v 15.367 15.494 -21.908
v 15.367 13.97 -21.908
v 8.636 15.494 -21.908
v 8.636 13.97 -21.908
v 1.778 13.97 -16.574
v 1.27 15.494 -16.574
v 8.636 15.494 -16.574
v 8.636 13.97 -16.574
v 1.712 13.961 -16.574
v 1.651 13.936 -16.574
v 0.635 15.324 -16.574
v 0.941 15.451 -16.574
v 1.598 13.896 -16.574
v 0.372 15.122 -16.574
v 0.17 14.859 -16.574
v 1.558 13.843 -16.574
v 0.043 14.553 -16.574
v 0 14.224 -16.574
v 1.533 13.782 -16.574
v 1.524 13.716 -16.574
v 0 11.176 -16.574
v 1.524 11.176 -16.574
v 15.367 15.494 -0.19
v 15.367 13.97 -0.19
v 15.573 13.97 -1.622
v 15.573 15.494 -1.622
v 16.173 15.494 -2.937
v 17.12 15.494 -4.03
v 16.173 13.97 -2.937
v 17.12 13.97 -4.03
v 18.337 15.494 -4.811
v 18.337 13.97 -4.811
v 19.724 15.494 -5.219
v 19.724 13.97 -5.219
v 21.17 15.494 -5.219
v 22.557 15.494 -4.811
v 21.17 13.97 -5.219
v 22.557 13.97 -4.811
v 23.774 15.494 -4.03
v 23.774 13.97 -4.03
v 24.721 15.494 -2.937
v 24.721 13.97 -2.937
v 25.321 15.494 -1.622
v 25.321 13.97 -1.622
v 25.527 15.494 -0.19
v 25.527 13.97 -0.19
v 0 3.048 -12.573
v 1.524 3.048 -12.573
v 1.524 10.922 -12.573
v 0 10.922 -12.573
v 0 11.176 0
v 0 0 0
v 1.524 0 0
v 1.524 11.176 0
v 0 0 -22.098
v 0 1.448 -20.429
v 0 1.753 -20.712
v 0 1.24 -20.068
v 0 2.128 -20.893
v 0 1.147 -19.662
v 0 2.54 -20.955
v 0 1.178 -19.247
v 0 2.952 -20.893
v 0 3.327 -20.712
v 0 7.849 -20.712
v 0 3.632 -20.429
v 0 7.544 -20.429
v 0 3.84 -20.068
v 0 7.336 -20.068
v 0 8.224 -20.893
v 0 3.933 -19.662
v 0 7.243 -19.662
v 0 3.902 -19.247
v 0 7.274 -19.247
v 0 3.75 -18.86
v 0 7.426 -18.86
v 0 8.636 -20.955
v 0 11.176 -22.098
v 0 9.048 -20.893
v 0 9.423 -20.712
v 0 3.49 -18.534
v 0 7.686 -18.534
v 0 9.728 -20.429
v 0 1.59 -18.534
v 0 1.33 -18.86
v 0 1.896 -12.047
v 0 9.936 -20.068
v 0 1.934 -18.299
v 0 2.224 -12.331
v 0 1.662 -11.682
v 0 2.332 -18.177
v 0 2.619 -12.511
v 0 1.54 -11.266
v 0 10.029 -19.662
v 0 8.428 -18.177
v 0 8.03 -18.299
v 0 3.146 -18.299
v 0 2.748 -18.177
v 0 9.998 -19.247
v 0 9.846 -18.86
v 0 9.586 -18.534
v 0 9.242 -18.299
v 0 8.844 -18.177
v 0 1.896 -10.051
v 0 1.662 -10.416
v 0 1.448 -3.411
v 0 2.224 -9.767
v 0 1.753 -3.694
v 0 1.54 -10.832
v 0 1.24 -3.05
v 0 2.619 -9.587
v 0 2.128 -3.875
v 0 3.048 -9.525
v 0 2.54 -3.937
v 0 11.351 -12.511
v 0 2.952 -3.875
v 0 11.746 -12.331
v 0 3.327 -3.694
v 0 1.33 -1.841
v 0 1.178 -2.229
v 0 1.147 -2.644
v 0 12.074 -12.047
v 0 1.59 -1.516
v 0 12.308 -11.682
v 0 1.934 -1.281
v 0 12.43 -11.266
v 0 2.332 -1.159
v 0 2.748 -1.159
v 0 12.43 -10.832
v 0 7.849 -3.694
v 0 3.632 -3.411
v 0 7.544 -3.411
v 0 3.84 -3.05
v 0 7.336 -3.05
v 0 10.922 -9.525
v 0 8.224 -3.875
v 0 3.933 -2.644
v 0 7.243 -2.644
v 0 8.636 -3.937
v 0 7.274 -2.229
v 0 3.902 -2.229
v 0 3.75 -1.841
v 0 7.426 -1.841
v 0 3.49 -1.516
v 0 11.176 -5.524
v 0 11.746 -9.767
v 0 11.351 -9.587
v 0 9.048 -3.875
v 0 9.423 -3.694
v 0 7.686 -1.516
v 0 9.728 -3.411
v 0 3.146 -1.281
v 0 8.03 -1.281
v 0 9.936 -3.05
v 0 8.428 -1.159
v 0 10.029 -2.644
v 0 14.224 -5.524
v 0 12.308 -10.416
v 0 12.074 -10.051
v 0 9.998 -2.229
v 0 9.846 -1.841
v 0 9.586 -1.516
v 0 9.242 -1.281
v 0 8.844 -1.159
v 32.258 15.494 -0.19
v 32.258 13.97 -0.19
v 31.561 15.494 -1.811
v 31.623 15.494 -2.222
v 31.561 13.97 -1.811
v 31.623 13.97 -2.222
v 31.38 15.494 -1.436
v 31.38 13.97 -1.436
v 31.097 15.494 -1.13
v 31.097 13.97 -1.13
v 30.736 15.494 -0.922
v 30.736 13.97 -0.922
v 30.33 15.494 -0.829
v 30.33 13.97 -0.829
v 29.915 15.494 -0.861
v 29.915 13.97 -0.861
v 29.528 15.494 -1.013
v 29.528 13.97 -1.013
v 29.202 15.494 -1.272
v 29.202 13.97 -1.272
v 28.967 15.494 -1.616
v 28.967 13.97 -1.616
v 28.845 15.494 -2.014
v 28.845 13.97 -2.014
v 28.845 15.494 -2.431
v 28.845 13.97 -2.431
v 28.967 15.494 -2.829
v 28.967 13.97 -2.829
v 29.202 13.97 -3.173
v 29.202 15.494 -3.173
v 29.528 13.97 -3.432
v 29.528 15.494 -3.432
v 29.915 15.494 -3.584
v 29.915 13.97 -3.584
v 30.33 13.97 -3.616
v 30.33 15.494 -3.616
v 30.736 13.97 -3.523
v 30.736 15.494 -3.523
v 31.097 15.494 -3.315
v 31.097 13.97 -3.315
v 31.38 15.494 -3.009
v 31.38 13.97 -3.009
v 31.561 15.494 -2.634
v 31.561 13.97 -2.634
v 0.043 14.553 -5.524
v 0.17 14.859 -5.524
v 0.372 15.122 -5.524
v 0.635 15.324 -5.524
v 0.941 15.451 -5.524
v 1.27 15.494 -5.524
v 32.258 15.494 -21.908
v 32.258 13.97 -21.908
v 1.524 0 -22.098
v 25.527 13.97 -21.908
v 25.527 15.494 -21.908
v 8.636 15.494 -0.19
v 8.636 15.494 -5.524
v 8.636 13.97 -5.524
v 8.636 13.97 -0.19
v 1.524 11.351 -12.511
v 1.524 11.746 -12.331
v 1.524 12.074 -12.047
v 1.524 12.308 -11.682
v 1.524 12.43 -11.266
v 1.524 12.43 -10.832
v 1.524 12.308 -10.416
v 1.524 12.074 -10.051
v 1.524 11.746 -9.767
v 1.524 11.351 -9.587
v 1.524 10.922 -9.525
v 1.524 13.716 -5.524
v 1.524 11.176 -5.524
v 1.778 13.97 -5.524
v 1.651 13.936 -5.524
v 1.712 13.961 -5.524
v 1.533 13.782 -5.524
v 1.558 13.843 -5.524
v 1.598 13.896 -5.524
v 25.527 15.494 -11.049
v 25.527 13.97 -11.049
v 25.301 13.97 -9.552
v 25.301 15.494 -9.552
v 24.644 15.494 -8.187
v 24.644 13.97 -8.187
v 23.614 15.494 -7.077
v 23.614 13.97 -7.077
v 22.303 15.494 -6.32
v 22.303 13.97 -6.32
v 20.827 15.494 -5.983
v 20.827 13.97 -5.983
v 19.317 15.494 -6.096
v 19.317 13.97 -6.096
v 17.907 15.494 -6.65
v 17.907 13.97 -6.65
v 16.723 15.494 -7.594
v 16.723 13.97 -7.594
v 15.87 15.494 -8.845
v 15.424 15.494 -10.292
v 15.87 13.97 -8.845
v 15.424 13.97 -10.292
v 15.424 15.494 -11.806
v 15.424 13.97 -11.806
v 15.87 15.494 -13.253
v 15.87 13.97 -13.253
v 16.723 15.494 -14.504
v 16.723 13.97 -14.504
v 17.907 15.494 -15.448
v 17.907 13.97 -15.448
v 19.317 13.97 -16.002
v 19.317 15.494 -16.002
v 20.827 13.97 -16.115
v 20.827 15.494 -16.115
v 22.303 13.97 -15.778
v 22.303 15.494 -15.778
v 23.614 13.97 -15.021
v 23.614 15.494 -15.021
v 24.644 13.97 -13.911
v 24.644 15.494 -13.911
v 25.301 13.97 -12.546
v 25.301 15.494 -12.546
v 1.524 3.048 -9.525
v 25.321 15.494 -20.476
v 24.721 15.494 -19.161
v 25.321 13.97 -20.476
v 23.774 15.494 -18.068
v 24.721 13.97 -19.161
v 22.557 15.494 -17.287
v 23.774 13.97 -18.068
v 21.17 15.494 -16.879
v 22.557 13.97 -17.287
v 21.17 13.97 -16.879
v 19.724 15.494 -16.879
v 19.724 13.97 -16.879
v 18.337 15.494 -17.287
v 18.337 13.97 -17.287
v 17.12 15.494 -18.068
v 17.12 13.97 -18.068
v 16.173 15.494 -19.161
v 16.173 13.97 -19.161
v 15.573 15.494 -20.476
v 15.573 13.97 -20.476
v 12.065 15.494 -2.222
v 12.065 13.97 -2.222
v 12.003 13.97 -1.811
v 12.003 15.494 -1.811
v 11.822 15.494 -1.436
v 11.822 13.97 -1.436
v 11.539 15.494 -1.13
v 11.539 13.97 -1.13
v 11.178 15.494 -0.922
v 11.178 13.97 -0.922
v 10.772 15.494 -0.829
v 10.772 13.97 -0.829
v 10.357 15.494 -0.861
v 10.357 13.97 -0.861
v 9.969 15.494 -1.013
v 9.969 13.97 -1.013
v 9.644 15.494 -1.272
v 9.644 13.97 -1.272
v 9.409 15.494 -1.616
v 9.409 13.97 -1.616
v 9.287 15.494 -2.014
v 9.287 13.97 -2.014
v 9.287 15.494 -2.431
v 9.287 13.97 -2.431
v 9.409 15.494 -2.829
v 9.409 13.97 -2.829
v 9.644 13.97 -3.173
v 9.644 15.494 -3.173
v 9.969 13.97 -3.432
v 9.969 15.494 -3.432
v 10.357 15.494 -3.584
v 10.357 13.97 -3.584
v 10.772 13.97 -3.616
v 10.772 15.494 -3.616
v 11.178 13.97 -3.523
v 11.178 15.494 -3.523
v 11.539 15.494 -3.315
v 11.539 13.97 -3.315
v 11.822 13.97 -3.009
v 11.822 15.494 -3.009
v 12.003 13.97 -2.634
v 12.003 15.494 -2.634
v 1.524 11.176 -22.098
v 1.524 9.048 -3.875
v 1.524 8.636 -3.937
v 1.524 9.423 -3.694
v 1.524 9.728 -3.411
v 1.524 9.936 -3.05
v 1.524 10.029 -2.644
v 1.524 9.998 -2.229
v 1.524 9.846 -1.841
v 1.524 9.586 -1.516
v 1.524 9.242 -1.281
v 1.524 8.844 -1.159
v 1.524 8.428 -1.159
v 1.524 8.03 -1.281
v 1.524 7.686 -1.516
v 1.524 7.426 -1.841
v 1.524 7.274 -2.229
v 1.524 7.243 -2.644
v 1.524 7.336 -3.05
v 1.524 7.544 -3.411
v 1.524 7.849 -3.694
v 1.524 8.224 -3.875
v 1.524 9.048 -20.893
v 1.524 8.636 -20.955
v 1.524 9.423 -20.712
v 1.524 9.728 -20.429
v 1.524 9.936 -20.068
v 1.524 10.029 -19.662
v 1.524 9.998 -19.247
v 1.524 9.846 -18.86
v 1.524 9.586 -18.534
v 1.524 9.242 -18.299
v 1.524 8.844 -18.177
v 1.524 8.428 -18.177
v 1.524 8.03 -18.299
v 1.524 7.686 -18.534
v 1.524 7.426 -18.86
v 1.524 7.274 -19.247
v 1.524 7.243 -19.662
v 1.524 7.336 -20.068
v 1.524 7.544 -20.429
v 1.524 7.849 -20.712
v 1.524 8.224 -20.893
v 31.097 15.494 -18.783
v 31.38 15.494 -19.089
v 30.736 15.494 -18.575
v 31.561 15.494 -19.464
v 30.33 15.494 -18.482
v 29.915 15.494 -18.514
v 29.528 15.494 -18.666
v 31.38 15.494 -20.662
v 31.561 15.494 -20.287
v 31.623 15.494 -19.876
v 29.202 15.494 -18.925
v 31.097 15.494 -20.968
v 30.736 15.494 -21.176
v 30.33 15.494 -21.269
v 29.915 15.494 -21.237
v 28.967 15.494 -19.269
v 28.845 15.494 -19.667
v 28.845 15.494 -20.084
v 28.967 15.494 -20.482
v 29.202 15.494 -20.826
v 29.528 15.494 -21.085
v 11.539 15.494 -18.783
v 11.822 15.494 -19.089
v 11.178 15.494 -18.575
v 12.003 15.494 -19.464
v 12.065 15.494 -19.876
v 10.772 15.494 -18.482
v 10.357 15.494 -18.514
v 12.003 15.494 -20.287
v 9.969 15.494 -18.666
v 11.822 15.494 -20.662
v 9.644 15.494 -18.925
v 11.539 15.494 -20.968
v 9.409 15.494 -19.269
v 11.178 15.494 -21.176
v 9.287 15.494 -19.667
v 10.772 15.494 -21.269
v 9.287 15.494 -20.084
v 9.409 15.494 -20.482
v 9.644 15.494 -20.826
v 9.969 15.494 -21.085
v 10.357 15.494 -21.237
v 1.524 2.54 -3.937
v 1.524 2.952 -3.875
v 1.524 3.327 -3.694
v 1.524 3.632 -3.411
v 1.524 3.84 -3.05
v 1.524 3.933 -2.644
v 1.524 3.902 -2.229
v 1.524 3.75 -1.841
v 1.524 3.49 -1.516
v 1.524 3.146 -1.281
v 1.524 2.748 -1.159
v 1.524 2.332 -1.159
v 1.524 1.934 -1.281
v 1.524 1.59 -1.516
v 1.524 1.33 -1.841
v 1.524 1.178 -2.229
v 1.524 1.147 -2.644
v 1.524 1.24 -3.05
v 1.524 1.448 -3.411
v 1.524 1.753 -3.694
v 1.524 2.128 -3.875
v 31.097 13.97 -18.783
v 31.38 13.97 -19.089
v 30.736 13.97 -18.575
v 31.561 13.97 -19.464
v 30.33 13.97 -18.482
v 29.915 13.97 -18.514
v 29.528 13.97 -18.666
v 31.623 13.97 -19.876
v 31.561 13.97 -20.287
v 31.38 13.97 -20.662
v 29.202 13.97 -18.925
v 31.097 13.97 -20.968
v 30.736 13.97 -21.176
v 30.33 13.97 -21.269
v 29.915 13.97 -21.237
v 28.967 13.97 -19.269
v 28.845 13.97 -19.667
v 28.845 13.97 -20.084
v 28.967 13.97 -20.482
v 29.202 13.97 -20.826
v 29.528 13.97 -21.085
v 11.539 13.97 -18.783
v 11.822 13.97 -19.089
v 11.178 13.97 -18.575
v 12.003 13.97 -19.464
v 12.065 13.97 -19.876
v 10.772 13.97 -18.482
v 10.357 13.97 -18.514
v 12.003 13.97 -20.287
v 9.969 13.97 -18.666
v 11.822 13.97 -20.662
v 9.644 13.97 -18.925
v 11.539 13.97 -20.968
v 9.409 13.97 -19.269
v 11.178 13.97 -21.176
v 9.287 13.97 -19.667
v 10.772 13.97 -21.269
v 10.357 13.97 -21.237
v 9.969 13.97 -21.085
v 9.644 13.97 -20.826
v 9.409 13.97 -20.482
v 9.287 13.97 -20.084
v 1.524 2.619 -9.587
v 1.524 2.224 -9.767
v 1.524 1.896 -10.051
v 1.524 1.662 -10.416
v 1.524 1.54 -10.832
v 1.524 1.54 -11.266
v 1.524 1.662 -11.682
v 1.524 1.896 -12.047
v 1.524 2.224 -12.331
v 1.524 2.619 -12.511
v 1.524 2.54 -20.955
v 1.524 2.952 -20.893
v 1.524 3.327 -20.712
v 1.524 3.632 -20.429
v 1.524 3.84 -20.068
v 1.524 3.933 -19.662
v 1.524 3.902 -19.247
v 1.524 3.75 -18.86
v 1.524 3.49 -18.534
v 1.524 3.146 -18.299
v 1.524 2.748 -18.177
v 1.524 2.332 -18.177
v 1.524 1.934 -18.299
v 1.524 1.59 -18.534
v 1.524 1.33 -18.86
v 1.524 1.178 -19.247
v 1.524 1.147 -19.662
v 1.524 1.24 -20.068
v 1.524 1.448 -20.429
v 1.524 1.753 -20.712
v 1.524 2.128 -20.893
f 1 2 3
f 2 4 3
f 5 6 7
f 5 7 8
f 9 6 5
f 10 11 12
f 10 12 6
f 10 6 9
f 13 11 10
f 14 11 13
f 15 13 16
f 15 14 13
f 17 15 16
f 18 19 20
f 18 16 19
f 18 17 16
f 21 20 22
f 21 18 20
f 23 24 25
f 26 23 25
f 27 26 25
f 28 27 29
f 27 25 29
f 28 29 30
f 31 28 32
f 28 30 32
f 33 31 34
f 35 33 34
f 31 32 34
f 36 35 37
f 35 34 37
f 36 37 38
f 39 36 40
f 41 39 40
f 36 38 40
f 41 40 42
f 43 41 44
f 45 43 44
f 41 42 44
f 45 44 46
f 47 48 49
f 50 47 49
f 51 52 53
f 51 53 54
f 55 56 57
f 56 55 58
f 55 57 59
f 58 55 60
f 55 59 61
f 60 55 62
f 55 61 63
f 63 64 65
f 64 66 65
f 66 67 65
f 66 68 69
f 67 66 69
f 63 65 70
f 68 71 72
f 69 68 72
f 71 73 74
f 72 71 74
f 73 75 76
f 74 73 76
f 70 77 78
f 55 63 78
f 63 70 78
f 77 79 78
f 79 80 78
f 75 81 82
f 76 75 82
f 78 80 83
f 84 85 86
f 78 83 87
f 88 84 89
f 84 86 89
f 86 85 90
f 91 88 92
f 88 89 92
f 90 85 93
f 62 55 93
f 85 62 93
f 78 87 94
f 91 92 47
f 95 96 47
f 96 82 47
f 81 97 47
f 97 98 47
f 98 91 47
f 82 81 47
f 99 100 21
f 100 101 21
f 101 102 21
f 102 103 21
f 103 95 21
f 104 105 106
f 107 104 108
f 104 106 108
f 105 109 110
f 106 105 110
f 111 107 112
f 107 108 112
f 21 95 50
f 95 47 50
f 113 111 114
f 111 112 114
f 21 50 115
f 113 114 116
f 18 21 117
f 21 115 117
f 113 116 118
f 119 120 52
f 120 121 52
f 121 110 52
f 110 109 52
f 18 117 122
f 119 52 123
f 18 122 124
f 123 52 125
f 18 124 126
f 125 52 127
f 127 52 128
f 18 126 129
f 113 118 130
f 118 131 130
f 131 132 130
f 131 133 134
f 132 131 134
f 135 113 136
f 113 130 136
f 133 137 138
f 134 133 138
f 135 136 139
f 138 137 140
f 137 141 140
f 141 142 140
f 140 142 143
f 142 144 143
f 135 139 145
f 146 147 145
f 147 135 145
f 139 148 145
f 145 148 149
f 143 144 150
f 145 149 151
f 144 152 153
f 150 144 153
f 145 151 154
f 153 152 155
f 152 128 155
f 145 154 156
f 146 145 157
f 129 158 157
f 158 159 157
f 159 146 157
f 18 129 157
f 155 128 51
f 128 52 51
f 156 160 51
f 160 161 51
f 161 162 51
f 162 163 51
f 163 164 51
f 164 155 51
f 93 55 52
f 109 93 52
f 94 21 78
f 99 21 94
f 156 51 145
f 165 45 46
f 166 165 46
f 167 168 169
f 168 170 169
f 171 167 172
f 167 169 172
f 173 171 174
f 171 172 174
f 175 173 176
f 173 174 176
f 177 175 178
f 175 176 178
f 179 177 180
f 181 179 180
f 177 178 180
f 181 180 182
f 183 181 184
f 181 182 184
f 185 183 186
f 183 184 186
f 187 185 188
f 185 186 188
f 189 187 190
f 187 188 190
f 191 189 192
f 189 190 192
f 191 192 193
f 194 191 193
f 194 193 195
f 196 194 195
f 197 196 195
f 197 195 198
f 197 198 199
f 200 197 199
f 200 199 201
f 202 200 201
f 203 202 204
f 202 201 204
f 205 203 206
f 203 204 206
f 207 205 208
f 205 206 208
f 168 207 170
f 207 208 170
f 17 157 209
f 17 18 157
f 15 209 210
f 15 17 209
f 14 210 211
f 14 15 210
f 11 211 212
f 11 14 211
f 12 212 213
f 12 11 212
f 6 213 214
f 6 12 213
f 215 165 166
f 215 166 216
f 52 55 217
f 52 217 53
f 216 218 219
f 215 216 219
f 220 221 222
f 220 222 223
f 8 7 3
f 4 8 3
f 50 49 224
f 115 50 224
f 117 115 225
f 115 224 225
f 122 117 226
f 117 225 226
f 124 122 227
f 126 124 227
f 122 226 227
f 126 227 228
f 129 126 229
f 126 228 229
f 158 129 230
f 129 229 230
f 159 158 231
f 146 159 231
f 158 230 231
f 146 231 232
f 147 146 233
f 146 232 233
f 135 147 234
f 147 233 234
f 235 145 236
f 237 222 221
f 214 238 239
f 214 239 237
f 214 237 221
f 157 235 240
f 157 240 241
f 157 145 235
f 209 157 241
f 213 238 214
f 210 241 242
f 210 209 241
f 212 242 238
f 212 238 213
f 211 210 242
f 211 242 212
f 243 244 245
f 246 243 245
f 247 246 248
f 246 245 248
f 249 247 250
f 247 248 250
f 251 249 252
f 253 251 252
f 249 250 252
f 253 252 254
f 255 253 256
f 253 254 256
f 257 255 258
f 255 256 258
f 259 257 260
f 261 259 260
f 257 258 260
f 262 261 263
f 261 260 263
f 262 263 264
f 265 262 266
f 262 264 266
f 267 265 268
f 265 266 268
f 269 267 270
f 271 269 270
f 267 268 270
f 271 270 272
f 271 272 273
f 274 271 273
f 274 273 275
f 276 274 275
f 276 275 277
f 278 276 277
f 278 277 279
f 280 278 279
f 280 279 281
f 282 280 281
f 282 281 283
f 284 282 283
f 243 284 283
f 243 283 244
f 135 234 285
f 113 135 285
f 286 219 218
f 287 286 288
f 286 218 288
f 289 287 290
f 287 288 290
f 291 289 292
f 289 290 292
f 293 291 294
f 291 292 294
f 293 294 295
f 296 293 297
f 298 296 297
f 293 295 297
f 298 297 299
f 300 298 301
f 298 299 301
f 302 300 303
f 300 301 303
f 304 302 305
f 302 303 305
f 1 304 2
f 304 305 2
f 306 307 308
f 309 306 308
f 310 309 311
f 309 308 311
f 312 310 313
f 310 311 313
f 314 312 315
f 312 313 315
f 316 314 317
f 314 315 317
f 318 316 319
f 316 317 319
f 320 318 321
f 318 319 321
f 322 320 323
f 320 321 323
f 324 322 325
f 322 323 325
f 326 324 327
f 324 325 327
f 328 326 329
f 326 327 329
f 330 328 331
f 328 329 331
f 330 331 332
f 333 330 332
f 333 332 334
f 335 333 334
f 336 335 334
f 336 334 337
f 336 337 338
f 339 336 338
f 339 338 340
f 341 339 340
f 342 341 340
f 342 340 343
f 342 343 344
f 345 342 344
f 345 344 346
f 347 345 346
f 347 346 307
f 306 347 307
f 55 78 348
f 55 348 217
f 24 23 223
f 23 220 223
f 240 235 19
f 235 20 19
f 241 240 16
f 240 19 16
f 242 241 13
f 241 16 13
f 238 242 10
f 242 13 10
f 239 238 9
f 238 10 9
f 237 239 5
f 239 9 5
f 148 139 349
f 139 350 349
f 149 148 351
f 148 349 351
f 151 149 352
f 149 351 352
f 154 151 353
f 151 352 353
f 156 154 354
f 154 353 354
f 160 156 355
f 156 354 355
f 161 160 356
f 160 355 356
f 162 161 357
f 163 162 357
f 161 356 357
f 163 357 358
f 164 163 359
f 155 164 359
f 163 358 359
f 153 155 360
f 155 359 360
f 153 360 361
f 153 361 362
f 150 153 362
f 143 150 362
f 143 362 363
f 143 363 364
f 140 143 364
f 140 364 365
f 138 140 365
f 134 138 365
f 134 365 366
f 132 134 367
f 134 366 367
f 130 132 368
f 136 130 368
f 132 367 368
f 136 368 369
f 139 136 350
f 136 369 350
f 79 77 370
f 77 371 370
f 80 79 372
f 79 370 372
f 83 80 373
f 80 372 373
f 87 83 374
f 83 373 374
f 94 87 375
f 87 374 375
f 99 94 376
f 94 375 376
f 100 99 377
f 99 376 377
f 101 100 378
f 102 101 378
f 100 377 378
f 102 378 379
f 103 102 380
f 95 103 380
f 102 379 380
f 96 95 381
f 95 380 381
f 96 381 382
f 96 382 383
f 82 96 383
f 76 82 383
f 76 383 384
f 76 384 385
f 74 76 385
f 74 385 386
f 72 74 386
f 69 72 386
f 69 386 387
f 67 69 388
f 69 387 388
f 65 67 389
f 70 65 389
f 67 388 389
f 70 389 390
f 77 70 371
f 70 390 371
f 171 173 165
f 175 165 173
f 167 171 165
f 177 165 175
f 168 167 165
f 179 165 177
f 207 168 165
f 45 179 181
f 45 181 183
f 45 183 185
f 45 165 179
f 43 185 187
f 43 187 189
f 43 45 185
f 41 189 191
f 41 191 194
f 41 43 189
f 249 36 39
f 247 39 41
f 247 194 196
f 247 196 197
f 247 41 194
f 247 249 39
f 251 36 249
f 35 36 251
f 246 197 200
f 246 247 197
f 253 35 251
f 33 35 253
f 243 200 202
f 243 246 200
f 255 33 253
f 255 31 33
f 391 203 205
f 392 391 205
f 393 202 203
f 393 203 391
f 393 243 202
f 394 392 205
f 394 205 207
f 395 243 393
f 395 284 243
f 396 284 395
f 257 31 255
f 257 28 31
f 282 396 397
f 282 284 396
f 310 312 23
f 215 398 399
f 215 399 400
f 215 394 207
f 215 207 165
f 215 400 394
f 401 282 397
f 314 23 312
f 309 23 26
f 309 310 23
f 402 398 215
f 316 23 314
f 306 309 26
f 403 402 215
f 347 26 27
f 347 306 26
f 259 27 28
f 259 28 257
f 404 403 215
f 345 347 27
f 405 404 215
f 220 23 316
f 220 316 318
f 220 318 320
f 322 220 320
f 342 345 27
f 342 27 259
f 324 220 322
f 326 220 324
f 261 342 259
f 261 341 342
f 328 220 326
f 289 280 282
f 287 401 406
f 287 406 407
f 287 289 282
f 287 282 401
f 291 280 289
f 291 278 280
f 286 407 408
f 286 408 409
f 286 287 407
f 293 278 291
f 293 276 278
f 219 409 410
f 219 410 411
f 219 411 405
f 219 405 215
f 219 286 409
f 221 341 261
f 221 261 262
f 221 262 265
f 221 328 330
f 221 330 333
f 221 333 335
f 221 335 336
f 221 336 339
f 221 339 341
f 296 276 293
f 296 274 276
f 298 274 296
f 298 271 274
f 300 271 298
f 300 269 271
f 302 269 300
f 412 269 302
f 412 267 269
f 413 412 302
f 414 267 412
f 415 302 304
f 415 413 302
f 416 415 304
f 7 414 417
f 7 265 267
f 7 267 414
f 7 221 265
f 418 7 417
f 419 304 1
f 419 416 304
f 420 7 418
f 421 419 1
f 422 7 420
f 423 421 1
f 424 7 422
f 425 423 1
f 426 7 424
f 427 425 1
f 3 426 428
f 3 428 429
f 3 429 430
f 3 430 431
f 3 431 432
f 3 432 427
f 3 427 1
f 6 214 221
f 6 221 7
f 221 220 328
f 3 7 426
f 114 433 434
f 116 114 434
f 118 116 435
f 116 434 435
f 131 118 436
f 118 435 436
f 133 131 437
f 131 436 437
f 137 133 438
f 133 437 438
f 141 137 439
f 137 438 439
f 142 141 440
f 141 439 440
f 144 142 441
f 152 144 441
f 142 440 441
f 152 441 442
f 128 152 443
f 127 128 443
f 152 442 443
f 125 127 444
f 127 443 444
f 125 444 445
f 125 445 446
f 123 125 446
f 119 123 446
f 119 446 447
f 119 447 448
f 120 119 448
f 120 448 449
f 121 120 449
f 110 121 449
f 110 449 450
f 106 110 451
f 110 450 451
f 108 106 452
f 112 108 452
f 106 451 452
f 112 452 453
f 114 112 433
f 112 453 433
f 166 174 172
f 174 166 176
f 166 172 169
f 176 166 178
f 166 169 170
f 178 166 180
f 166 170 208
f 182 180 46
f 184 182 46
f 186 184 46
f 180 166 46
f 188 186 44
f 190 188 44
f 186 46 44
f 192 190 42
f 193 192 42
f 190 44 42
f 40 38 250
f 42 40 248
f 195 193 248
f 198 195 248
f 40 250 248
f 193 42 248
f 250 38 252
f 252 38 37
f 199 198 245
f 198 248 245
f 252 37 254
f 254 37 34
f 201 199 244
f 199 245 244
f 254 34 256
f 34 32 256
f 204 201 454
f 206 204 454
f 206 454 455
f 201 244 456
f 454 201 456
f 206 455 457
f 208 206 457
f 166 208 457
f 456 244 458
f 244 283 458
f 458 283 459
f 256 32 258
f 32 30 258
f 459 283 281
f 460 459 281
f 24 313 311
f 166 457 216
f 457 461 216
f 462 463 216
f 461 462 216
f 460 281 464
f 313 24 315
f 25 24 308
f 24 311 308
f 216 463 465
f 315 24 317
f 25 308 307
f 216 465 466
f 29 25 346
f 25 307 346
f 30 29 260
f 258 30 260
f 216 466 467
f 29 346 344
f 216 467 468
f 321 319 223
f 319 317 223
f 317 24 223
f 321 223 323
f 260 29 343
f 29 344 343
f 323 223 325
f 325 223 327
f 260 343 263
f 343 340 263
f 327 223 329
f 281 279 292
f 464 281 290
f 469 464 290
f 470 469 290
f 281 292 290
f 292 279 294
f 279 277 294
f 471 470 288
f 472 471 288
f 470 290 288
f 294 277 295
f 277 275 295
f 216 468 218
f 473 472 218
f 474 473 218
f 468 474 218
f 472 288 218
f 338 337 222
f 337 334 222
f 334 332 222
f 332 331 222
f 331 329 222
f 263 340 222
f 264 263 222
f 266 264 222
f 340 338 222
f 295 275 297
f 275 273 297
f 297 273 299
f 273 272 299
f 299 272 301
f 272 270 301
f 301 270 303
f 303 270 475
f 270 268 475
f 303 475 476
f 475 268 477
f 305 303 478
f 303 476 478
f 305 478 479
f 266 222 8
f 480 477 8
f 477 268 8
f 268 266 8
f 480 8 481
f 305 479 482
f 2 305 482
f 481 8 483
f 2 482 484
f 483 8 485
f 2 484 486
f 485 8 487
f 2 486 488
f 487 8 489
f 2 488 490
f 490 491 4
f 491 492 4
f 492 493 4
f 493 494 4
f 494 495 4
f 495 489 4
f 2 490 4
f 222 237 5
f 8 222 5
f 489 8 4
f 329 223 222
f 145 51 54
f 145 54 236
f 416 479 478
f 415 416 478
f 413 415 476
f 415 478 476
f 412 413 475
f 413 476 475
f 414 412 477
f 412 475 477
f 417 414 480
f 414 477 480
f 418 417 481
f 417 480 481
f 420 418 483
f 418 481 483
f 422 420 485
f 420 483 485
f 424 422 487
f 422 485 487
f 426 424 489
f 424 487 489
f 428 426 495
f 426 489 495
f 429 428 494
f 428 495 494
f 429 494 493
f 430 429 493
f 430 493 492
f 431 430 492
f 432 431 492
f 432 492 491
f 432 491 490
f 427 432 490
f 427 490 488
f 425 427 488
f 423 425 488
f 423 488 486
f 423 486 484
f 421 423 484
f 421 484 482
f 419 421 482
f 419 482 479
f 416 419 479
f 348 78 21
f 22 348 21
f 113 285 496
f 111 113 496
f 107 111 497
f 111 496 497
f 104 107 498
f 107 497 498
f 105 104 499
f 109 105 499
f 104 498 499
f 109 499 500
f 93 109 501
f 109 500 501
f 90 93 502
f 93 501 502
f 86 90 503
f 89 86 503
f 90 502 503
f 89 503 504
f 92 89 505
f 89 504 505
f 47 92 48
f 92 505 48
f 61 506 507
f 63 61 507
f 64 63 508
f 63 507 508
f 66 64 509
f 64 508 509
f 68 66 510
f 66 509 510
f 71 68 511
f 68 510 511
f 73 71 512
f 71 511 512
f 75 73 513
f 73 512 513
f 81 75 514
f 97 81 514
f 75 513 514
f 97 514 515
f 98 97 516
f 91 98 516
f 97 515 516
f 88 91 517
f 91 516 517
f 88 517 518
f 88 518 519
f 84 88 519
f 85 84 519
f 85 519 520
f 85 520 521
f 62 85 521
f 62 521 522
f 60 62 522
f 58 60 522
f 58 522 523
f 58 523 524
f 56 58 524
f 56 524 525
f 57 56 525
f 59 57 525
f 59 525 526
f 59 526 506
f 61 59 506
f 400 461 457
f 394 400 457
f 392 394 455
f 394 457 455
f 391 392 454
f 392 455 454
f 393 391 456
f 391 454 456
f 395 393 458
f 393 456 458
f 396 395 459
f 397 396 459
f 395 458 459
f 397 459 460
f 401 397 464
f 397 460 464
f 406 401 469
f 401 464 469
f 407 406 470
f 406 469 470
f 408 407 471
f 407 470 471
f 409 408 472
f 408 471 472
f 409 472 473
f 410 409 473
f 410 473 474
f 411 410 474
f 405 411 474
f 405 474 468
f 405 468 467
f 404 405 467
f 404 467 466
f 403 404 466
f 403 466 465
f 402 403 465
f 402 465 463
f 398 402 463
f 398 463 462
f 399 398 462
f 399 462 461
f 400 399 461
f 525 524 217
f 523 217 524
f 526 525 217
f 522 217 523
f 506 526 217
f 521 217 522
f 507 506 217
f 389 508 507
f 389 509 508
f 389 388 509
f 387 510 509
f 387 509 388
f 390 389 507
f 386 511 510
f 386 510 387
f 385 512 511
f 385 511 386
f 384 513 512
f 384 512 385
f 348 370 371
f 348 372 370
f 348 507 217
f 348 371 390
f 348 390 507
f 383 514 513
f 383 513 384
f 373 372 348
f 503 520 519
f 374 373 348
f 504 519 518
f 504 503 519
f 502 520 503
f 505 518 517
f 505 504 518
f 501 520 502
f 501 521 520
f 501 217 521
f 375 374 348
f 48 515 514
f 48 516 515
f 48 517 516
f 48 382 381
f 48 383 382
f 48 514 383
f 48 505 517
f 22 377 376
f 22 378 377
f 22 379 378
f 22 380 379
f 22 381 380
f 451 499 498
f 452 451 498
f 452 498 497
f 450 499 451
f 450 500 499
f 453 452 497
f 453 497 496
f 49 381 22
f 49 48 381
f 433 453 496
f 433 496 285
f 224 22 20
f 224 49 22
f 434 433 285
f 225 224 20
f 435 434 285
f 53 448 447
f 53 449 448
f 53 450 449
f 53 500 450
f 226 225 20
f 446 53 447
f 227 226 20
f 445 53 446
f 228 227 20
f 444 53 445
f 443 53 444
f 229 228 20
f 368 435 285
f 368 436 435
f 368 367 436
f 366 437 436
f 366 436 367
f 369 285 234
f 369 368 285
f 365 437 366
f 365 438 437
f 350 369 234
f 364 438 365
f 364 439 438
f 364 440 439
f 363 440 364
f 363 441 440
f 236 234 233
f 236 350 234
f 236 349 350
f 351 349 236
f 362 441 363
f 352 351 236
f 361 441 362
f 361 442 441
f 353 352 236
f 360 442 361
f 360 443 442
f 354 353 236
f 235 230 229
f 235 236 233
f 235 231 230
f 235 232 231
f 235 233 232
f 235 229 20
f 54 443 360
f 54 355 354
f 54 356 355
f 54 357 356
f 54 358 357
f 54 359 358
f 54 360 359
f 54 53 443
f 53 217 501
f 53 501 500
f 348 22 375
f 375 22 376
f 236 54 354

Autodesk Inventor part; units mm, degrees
ref_plane "YZ Plane" through (0, 0, 0) normal (1, 0, 0) x (0, 1, 0)
ref_plane "XZ Plane" through (0, 0, 0) normal (0, 1, 0) x (-1, 0, 0)
ref_plane "XY Plane" through (0, 0, 0) normal (0, 0, 1) x (1, 0, 0)
sketch "Sketch1" plane through (0, 0, 0) normal (1, 0, 0) x (0, 1, 0)
  line L0 (0, 0) -> (11.176, 0)
  line L1 (11.176, -22.098) -> (0, -22.098)
  line L2 (0, -22.098) -> (0, 0)
  line L3 (11.176, 0) -> (11.176, -5.5245)
  line L4 (11.176, -22.098) -> (11.176, -16.5735)
  line L5 (11.176, -5.5245) -> (15.494, -5.5245)
  line L6 (15.494, -5.5245) -> (15.494, -16.5735)
  line L7 (15.494, -16.5735) -> (11.176, -16.5735)
  line L8 (11.176, 0) -> (11.176, -5.5245)
  line L9 (11.176, -16.5735) -> (11.176, -22.098)
  dimension "d0" = 11.176
  dimension "d1" = 22.098
  dimension "d2" = 5.5245
  dimension "d3" = 5.5245
  dimension "d4" = 4.318
extrude "Extrusion1" add sketch "Sketch1" along normal blind 1.524
sketch "Sketch2" plane through (1.524, 0, 0) normal (1, 0, 0) x (0, 0, -1)
  line L0 (16.5735, 15.494) -> (5.5245, 15.494) projected
  line L1 (5.5245, 13.97) -> (16.5735, 13.97)
  line L2 (16.5735, 11.176) -> (16.5735, 15.494) projected
  line L3 (16.5735, 13.97) -> (21.9075, 13.97)
  line L4 (21.9075, 13.97) -> (21.9075, 15.494)
  line L5 (21.9075, 15.494) -> (16.5735, 15.494)
  line L6 (5.5245, 15.494) -> (0.1905, 15.494)
  line L7 (0.1905, 15.494) -> (0.1905, 13.97)
  line L8 (0.1905, 13.97) -> (5.5245, 13.97)
  point P0 (0, 0)
extrude "Extrusion2" add sketch "Sketch2" along normal blind 30.734
fillet "Fillet1" radius 1.27 1 edges at (0, 15.494, -11.049)
fillet "Fillet2" radius 0.254 1 edges at (1.524, 13.97, -11.049)
sketch "Sketch3" plane through (1.524, 0, 0) normal (1, 0, 0) x (0, 0, -1)
  line L0 (22.098, 0) -> (22.098, 11.176) projected
  line L1 (0, 0) -> (22.098, 0) projected
  circle A0 centre (19.558, 2.54) radius 1.397
  line L2 (22.098, 11.176) -> (16.5735, 11.176) projected
  circle A1 centre (19.558, 8.636) radius 1.397
  circle A2 centre (2.54, 2.54) radius 1.397
  circle A3 centre (2.54, 8.636) radius 1.397
  line L3 (11.049, 1.524) -> (11.049, 12.446) construction
  line L4 (12.573, 3.048) -> (12.573, 10.922)
  line L5 (9.525, 10.922) -> (9.525, 3.048)
  arc A4 (9.525, 3.048) -> (12.573, 3.048) centre (11.049, 3.048) ccw
  arc A5 (12.573, 10.922) -> (9.525, 10.922) centre (11.049, 10.922) ccw
  point P0 (11.049, 6.985)
  dimension "d16" = 2.794
  dimension "d19" = 2.794
  dimension "d23" = 10.922
  dimension "d24" = 3.048
  dimension "d50" = 17.018
extrude "Extrusion3" cut sketch "Sketch3" against normal blind 30.734
sketch "Sketch4" plane through (1.524, 15.494, -0.1905) normal (0, 1, 0) x (1, 0, 0)
  line L0 (-1.524, 16.383) -> (0, 16.383) projected
  line L1 (0, 16.383) -> (7.112, 16.383)
  line L2 (-0.254, 5.334) -> (0, 5.334) projected
  line L3 (0, 5.334) -> (7.112, 5.334)
  line L4 (7.112, 16.383) -> (7.112, 21.717)
  line L5 (0, 21.717) -> (30.734, 21.717) projected
  line L6 (7.112, 21.717) -> (0, 21.717)
  line L7 (0, 21.9075) -> (0, 16.383) projected
  line L8 (0, 21.717) -> (0, 16.383)
  line L9 (7.112, 5.334) -> (7.112, 0)
  line L10 (0, 0) -> (30.734, 0) projected
  line L11 (7.112, 0) -> (0, 0)
  line L12 (0, 5.334) -> (0, 16.383) projected
  line L13 (0, 0) -> (0, 5.334)
  point P0 (-1.524, -0.1905)
  dimension "d27" = 7.112
  dimension "d28" = 7.112
extrude "Extrusion4" cut sketch "Sketch4" against normal blind 30.734
sketch "Sketch5" plane through (32.258, 13.97, -21.9075) normal (0, -1, 0) x (1, 0, 0)
  circle A0 centre (-11.811, 10.8585) radius 5.08
  line L0 (-23.622, 21.717) -> (0, 21.717) projected
  circle A1 centre (-11.811, 21.717) radius 5.08
  line L1 (-23.622, 0) -> (0, 0) projected
  circle A2 centre (-11.811, 0) radius 5.08
  point P0 (-32.258, 21.9075)
  dimension "d31" = 10.16
  dimension "d32" = 10.16
  dimension "d33" = 10.16
extrude "Extrusion5" cut sketch "Sketch5" against normal blind 30.734
sketch "Sketch6" plane through (32.258, 13.97, -21.9075) normal (0, -1, 0) x (1, 0, 0)
  circle A0 centre (-2.032, 19.685) radius 1.397
  circle A1 centre (-11.811, 10.8585) radius 5.08 projected
  line L0 (0, 21.717) -> (0, 0) projected
  line L1 (0, 0) -> (0, 2.032)
  line L2 (0, 2.032) -> (-2.032, 2.032)
  circle A2 centre (-2.032, 2.032) radius 1.397
  line L3 (-23.622, 21.717) -> (-23.622, 16.383) projected
  line L4 (-23.622, 21.717) -> (-23.622, 19.685)
  line L5 (-23.622, 19.685) -> (-21.59, 19.685)
  circle A3 centre (-21.59, 19.685) radius 1.397
  line L6 (-23.622, 5.334) -> (-23.622, 0) projected
  line L7 (-23.622, 0) -> (-23.622, 2.032)
  line L8 (-23.622, 2.032) -> (-21.59, 2.032)
  circle A4 centre (-21.59, 2.032) radius 1.397
  point P0 (-32.258, 21.9075)
  dimension "d38" = 2.794
  dimension "d39" = 2.032
  dimension "d40" = 2.032
  dimension "d41" = 2.794
  dimension "d42" = 2.032
  dimension "d43" = 2.032
  dimension "d44" = 2.794
  dimension "d45" = 2.032
  dimension "d46" = 2.032
  dimension "d47" = 2.794
extrude "Extrusion6" cut sketch "Sketch6" against normal blind 25.4 contours A0 | A2 | A3 | A4
properties part number "msheehan_motor_mount"
